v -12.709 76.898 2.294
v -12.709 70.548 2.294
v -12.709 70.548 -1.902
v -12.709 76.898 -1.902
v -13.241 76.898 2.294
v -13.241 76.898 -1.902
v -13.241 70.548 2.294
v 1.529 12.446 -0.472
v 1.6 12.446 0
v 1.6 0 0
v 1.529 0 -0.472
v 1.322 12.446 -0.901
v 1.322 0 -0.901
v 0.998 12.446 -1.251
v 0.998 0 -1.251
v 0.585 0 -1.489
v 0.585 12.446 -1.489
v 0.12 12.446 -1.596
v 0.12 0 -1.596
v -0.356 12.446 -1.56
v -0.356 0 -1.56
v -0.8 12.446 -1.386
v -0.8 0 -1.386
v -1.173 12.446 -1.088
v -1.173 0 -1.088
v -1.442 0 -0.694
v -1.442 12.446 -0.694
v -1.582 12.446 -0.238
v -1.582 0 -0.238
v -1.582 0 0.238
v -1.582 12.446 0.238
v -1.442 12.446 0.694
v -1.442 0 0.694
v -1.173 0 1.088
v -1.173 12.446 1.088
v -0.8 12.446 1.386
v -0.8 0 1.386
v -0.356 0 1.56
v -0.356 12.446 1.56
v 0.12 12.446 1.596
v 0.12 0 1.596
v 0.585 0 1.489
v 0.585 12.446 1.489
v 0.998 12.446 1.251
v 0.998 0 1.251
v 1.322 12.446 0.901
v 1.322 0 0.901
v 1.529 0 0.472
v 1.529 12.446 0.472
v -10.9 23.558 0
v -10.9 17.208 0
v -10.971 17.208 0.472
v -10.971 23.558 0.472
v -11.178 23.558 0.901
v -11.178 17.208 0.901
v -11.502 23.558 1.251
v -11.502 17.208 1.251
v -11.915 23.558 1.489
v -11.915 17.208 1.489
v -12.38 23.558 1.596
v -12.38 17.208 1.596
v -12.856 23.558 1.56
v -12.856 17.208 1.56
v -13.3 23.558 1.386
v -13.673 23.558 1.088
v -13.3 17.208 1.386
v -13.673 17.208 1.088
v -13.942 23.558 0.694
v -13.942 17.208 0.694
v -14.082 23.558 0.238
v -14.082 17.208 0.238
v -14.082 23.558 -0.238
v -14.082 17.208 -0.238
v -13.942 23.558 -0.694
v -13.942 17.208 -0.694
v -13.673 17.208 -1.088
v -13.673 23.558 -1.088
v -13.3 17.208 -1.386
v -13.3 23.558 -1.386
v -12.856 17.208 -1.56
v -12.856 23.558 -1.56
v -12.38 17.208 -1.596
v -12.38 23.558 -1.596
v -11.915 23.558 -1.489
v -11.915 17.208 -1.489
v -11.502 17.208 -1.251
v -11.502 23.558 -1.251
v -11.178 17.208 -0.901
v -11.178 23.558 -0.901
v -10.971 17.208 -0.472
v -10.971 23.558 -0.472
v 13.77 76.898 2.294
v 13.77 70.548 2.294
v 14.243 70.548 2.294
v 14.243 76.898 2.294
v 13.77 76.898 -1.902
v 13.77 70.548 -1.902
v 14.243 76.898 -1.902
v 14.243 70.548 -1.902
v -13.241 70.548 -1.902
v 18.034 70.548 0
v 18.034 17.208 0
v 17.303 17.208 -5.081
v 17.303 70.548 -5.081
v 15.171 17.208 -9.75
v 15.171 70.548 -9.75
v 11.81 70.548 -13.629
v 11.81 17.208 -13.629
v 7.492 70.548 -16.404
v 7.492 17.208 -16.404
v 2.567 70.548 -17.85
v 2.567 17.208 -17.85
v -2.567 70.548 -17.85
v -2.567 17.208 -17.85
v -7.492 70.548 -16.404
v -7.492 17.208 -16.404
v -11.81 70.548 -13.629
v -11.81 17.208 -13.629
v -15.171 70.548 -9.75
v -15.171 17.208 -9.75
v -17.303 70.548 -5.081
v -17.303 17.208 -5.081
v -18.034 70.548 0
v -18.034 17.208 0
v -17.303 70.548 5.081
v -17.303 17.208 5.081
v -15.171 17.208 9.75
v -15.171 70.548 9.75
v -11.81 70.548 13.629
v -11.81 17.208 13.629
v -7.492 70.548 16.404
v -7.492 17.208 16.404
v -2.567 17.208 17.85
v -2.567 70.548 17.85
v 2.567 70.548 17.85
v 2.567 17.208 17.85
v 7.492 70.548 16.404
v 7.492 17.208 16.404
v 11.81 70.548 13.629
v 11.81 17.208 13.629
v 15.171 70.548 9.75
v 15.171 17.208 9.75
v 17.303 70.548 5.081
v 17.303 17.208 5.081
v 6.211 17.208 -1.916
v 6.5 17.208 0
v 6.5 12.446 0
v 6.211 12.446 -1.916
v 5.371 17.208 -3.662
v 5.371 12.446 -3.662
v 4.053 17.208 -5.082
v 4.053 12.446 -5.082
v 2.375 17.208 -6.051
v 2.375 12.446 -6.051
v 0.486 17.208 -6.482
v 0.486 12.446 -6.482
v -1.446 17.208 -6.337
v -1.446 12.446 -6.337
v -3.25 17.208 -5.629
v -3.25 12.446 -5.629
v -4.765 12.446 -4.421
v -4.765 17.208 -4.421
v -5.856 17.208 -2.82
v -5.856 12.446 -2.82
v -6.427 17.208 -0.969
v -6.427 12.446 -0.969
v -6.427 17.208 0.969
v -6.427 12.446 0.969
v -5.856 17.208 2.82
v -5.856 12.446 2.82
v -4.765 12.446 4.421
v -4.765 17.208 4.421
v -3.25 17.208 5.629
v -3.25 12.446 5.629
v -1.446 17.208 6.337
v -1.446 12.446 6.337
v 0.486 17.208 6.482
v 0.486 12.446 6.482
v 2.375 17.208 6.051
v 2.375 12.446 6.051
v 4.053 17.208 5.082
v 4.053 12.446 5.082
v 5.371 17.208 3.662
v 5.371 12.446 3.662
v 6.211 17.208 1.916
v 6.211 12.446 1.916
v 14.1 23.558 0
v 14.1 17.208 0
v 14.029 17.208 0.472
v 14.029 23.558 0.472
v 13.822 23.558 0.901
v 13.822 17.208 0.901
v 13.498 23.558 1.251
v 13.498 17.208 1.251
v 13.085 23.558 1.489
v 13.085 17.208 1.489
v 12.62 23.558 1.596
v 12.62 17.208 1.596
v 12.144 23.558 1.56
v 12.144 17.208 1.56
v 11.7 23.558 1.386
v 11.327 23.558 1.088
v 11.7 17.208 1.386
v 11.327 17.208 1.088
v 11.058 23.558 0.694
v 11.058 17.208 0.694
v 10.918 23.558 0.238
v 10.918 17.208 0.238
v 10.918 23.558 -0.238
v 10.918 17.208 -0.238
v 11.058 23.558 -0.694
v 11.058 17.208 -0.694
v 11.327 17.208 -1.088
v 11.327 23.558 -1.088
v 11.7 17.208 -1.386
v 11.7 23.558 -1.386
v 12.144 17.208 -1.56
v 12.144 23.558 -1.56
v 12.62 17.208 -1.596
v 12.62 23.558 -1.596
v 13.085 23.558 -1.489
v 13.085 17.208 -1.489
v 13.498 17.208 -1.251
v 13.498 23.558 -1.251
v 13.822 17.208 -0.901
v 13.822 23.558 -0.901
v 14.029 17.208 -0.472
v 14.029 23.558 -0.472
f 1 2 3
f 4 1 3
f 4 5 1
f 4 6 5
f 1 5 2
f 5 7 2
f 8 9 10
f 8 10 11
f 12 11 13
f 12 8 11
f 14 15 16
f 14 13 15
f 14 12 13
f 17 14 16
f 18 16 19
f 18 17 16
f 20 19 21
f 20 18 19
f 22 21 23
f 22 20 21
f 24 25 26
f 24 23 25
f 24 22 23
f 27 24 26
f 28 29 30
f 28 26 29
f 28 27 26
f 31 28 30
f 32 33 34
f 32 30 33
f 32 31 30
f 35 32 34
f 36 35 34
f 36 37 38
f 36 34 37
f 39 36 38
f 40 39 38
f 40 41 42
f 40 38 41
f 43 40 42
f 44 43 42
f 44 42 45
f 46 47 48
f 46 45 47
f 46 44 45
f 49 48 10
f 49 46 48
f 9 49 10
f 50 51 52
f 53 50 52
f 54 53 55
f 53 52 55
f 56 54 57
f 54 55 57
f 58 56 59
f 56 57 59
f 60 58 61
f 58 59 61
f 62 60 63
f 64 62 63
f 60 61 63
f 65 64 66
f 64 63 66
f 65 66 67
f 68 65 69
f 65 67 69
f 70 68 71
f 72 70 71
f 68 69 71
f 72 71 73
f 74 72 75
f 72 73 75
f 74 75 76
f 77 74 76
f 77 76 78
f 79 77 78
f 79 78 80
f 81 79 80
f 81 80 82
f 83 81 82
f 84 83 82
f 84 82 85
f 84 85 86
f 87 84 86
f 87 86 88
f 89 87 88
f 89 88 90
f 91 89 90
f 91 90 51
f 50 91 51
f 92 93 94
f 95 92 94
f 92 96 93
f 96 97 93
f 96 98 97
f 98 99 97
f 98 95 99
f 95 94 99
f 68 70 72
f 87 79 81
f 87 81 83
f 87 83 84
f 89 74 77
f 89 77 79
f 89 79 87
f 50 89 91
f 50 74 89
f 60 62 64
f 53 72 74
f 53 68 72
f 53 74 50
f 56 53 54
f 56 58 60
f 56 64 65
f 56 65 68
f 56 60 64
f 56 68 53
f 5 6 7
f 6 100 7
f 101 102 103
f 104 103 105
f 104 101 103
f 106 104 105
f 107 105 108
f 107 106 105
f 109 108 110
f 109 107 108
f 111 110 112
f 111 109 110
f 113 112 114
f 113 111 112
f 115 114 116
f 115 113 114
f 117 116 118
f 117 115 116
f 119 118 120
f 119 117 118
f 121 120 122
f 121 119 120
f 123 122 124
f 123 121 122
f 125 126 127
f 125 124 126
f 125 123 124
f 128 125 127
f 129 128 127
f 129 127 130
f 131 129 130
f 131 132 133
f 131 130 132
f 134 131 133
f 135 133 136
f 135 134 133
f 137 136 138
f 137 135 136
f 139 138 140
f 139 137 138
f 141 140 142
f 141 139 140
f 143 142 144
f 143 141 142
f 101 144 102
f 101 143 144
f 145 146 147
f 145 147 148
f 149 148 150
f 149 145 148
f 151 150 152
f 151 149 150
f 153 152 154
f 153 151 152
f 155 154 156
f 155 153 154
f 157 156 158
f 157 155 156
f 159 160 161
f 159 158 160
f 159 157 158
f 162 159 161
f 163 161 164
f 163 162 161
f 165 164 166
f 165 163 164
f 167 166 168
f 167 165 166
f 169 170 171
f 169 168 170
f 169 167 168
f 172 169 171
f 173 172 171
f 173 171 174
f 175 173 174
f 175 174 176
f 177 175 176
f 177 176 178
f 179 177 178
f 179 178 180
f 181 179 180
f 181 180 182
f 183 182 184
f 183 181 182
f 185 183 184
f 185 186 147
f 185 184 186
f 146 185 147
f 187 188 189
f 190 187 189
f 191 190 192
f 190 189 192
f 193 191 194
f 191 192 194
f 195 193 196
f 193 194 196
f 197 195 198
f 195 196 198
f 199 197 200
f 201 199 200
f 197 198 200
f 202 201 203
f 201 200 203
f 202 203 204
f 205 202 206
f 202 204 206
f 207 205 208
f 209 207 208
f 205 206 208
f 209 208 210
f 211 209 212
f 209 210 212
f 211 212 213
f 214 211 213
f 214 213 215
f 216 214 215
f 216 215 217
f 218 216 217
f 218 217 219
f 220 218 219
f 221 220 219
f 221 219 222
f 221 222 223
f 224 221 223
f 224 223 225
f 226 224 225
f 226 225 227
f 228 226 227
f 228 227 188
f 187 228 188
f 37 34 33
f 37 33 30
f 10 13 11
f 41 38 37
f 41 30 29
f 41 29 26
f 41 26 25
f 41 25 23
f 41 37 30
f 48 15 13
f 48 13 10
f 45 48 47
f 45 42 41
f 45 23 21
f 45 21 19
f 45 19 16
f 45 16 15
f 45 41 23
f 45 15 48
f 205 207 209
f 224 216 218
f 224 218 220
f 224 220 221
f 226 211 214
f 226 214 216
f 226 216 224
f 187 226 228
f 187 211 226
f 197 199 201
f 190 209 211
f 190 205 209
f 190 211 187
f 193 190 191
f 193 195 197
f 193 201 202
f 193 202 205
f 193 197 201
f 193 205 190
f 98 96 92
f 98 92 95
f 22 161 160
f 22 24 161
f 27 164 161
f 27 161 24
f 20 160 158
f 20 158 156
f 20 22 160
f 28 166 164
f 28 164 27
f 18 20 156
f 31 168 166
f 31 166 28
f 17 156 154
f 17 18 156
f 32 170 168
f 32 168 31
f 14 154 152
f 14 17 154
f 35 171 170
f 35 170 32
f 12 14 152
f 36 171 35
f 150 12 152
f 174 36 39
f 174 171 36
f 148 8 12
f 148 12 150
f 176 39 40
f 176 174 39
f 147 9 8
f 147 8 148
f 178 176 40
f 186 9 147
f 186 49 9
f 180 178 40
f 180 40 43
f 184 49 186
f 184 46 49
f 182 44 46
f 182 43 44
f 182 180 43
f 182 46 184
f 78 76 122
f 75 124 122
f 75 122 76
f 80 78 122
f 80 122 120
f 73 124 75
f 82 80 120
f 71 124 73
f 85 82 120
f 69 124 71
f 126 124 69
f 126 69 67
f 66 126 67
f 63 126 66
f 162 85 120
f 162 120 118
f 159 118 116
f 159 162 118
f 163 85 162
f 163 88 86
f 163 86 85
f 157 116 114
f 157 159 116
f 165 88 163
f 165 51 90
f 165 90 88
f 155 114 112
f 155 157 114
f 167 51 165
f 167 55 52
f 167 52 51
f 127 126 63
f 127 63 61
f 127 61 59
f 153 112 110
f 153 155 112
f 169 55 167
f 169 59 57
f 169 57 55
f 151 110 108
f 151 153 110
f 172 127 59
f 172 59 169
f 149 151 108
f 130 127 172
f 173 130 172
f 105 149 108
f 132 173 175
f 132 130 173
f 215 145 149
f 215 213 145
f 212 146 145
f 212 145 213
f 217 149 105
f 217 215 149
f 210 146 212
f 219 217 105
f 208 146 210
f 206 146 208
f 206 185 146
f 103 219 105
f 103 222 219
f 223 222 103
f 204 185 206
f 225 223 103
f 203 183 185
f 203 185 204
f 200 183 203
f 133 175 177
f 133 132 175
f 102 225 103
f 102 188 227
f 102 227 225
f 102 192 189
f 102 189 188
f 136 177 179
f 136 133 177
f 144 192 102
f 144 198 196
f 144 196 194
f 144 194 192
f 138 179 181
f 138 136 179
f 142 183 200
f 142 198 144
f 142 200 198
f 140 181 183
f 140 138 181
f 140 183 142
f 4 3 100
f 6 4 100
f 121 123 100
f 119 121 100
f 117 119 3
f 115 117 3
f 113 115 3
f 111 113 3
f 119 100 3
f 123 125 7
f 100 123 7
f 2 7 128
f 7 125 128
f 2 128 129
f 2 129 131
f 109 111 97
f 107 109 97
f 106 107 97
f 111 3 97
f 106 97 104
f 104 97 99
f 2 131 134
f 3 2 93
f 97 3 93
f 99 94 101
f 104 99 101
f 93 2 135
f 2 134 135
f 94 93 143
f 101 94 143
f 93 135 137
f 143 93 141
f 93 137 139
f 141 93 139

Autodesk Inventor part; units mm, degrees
ref_plane "YZ Plane" through (0, 0, 0) normal (1, 0, 0) x (0, 1, 0)
ref_plane "XZ Plane" through (0, 0, 0) normal (0, 1, 0) x (-1, 0, 0)
ref_plane "XY Plane" through (0, 0, 0) normal (0, 0, 1) x (1, 0, 0)
sketch "Sketch1" plane through (0, 0, 0) normal (0, 0, 1) x (1, 0, 0)
  line L0 (0, 0) -> (1.6, 0)
  line L1 (1.6, 0) -> (1.6, 12.446)
  line L2 (0, 17.2085) -> (18.034, 17.2085)
  line L3 (0, 12.446) -> (6.5, 12.446)
  line L4 (6.5, 12.446) -> (6.5, 17.2085)
  line L5 (18.034, 17.2085) -> (18.034, 70.5485)
  line L6 (18.034, 70.5485) -> (0, 70.5485)
  line L7 (0, 70.5485) -> (0, 0)
  dimension "d0" = 1.6
  dimension "d1" = 12.446
  dimension "d2" = 18.034
  dimension "d3" = 6.5
  dimension "d4" = 4.7625
  dimension "d5" = 53.34
revolve "Revolution1" add sketch "Sketch1" angle 360 about axis through (0, 70.5485, 0) along (0, -1, 0)
sketch "Sketch2" plane through (0, 17.2085, 0) normal (0, -1, 0) x (1, 0, 0)
  circle A0 centre (0, 0) radius 12.5
  circle A1 centre (-12.5, 0) radius 1.6
  circle A2 centre (12.5, 0) radius 1.6
  point P0 (0, 0)
  dimension "d7" = 25
  dimension "d8" = 3.2
  dimension "d9" = 3.2
extrude "Extrusion1" cut sketch "Sketch2" against normal blind 6.35 contours A0 A2 | A0 A2 | A1 A0 | A0 A1
sketch "Sketch3" plane through (0, 70.5485, 0) normal (0, 1, 0) x (1, 0, 0)
  line L0 (14.2427, 1.9025) -> (13.7699, 1.9025)
  line L1 (13.7699, 1.9025) -> (13.7699, -2.2939)
  line L2 (13.7699, -2.2939) -> (14.2427, -2.2939)
  line L3 (14.2427, -2.2939) -> (14.2427, 1.9025)
  line L4 (-12.709, 1.9025) -> (-13.2409, 1.9025)
  line L5 (-13.2409, 1.9025) -> (-13.2409, -2.2939)
  line L6 (-13.2409, -2.2939) -> (-12.709, -2.2939)
  line L7 (-12.709, -2.2939) -> (-12.709, 1.9025)
  point P0 (0, 0)
extrude "Extrusion2" add sketch "Sketch3" along normal blind 6.35
properties part number "540DCMotor"
